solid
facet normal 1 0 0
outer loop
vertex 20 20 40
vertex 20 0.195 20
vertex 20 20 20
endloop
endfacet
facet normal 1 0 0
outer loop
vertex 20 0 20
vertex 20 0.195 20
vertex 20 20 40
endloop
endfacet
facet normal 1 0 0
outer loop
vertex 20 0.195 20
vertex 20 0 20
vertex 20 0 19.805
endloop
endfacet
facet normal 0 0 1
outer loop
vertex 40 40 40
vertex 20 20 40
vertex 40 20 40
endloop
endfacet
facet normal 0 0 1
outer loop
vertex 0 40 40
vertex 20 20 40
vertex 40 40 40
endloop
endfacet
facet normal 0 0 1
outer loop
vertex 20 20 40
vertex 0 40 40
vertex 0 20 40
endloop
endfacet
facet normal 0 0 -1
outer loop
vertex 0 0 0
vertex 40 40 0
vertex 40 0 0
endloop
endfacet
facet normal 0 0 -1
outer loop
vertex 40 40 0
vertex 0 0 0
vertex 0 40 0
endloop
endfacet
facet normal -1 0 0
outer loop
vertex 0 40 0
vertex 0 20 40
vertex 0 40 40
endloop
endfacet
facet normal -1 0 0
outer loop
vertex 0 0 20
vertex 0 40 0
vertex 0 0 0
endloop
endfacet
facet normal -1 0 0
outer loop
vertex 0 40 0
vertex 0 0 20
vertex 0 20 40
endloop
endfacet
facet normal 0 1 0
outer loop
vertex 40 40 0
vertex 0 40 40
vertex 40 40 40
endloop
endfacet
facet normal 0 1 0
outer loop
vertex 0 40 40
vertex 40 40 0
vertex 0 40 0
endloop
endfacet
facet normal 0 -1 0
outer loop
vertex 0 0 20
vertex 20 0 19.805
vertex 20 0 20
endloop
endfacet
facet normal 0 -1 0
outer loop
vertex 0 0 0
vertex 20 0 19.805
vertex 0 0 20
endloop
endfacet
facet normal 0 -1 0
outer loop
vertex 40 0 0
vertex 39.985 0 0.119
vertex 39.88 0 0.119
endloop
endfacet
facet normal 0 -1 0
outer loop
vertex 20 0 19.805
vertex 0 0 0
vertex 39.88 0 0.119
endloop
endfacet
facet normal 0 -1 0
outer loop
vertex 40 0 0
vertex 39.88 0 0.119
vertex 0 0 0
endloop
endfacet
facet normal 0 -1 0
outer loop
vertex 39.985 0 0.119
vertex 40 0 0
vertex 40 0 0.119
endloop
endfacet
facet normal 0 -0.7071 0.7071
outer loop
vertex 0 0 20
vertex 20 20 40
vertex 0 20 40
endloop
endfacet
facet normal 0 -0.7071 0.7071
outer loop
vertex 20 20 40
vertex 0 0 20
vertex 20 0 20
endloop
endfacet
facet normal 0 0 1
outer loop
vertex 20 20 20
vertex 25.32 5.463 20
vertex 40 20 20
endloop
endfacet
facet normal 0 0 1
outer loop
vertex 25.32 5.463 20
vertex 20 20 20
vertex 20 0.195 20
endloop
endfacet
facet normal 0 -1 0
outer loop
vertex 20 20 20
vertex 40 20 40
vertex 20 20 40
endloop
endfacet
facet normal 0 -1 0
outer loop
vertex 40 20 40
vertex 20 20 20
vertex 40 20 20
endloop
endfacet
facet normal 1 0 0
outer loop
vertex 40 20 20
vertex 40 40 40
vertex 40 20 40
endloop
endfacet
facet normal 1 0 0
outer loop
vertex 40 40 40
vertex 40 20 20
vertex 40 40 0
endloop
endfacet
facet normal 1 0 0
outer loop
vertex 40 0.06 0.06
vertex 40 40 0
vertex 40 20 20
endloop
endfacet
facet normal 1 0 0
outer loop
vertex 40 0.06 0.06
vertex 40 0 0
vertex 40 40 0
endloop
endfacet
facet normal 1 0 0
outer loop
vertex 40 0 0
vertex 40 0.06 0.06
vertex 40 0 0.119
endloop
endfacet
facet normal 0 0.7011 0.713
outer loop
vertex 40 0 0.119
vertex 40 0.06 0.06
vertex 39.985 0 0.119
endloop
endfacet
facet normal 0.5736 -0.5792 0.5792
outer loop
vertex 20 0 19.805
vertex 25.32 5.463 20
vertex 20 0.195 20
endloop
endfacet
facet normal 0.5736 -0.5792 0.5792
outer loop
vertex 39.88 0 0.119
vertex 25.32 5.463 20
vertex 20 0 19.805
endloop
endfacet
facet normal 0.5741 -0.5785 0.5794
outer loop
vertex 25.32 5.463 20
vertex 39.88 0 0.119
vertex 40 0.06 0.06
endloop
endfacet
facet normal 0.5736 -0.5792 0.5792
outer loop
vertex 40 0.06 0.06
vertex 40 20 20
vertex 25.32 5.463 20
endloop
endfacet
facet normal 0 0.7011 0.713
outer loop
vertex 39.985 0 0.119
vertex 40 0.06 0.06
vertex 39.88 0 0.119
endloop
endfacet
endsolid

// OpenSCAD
translate([0, 20, 0])
cube([40,20,40]);

difference(){
cube([20,40,40]);
 translate([0, 0, 20])
    rotate([45, 0, 0])
cube([20,40,40]);
}

// cubo con plano doble inclinado
translate([40, 20, 20])
  rotate([180, 0, 270])
    difference() {
      cube([20, 20, 20], center=false);

      mirror([0,0,1]){
        rotate([35, 45, 0]){
          color([1,0.8,0]) {
            cube([28.2, 28.2, 28.2], center=false);
          }
        }
      }
    }
  
